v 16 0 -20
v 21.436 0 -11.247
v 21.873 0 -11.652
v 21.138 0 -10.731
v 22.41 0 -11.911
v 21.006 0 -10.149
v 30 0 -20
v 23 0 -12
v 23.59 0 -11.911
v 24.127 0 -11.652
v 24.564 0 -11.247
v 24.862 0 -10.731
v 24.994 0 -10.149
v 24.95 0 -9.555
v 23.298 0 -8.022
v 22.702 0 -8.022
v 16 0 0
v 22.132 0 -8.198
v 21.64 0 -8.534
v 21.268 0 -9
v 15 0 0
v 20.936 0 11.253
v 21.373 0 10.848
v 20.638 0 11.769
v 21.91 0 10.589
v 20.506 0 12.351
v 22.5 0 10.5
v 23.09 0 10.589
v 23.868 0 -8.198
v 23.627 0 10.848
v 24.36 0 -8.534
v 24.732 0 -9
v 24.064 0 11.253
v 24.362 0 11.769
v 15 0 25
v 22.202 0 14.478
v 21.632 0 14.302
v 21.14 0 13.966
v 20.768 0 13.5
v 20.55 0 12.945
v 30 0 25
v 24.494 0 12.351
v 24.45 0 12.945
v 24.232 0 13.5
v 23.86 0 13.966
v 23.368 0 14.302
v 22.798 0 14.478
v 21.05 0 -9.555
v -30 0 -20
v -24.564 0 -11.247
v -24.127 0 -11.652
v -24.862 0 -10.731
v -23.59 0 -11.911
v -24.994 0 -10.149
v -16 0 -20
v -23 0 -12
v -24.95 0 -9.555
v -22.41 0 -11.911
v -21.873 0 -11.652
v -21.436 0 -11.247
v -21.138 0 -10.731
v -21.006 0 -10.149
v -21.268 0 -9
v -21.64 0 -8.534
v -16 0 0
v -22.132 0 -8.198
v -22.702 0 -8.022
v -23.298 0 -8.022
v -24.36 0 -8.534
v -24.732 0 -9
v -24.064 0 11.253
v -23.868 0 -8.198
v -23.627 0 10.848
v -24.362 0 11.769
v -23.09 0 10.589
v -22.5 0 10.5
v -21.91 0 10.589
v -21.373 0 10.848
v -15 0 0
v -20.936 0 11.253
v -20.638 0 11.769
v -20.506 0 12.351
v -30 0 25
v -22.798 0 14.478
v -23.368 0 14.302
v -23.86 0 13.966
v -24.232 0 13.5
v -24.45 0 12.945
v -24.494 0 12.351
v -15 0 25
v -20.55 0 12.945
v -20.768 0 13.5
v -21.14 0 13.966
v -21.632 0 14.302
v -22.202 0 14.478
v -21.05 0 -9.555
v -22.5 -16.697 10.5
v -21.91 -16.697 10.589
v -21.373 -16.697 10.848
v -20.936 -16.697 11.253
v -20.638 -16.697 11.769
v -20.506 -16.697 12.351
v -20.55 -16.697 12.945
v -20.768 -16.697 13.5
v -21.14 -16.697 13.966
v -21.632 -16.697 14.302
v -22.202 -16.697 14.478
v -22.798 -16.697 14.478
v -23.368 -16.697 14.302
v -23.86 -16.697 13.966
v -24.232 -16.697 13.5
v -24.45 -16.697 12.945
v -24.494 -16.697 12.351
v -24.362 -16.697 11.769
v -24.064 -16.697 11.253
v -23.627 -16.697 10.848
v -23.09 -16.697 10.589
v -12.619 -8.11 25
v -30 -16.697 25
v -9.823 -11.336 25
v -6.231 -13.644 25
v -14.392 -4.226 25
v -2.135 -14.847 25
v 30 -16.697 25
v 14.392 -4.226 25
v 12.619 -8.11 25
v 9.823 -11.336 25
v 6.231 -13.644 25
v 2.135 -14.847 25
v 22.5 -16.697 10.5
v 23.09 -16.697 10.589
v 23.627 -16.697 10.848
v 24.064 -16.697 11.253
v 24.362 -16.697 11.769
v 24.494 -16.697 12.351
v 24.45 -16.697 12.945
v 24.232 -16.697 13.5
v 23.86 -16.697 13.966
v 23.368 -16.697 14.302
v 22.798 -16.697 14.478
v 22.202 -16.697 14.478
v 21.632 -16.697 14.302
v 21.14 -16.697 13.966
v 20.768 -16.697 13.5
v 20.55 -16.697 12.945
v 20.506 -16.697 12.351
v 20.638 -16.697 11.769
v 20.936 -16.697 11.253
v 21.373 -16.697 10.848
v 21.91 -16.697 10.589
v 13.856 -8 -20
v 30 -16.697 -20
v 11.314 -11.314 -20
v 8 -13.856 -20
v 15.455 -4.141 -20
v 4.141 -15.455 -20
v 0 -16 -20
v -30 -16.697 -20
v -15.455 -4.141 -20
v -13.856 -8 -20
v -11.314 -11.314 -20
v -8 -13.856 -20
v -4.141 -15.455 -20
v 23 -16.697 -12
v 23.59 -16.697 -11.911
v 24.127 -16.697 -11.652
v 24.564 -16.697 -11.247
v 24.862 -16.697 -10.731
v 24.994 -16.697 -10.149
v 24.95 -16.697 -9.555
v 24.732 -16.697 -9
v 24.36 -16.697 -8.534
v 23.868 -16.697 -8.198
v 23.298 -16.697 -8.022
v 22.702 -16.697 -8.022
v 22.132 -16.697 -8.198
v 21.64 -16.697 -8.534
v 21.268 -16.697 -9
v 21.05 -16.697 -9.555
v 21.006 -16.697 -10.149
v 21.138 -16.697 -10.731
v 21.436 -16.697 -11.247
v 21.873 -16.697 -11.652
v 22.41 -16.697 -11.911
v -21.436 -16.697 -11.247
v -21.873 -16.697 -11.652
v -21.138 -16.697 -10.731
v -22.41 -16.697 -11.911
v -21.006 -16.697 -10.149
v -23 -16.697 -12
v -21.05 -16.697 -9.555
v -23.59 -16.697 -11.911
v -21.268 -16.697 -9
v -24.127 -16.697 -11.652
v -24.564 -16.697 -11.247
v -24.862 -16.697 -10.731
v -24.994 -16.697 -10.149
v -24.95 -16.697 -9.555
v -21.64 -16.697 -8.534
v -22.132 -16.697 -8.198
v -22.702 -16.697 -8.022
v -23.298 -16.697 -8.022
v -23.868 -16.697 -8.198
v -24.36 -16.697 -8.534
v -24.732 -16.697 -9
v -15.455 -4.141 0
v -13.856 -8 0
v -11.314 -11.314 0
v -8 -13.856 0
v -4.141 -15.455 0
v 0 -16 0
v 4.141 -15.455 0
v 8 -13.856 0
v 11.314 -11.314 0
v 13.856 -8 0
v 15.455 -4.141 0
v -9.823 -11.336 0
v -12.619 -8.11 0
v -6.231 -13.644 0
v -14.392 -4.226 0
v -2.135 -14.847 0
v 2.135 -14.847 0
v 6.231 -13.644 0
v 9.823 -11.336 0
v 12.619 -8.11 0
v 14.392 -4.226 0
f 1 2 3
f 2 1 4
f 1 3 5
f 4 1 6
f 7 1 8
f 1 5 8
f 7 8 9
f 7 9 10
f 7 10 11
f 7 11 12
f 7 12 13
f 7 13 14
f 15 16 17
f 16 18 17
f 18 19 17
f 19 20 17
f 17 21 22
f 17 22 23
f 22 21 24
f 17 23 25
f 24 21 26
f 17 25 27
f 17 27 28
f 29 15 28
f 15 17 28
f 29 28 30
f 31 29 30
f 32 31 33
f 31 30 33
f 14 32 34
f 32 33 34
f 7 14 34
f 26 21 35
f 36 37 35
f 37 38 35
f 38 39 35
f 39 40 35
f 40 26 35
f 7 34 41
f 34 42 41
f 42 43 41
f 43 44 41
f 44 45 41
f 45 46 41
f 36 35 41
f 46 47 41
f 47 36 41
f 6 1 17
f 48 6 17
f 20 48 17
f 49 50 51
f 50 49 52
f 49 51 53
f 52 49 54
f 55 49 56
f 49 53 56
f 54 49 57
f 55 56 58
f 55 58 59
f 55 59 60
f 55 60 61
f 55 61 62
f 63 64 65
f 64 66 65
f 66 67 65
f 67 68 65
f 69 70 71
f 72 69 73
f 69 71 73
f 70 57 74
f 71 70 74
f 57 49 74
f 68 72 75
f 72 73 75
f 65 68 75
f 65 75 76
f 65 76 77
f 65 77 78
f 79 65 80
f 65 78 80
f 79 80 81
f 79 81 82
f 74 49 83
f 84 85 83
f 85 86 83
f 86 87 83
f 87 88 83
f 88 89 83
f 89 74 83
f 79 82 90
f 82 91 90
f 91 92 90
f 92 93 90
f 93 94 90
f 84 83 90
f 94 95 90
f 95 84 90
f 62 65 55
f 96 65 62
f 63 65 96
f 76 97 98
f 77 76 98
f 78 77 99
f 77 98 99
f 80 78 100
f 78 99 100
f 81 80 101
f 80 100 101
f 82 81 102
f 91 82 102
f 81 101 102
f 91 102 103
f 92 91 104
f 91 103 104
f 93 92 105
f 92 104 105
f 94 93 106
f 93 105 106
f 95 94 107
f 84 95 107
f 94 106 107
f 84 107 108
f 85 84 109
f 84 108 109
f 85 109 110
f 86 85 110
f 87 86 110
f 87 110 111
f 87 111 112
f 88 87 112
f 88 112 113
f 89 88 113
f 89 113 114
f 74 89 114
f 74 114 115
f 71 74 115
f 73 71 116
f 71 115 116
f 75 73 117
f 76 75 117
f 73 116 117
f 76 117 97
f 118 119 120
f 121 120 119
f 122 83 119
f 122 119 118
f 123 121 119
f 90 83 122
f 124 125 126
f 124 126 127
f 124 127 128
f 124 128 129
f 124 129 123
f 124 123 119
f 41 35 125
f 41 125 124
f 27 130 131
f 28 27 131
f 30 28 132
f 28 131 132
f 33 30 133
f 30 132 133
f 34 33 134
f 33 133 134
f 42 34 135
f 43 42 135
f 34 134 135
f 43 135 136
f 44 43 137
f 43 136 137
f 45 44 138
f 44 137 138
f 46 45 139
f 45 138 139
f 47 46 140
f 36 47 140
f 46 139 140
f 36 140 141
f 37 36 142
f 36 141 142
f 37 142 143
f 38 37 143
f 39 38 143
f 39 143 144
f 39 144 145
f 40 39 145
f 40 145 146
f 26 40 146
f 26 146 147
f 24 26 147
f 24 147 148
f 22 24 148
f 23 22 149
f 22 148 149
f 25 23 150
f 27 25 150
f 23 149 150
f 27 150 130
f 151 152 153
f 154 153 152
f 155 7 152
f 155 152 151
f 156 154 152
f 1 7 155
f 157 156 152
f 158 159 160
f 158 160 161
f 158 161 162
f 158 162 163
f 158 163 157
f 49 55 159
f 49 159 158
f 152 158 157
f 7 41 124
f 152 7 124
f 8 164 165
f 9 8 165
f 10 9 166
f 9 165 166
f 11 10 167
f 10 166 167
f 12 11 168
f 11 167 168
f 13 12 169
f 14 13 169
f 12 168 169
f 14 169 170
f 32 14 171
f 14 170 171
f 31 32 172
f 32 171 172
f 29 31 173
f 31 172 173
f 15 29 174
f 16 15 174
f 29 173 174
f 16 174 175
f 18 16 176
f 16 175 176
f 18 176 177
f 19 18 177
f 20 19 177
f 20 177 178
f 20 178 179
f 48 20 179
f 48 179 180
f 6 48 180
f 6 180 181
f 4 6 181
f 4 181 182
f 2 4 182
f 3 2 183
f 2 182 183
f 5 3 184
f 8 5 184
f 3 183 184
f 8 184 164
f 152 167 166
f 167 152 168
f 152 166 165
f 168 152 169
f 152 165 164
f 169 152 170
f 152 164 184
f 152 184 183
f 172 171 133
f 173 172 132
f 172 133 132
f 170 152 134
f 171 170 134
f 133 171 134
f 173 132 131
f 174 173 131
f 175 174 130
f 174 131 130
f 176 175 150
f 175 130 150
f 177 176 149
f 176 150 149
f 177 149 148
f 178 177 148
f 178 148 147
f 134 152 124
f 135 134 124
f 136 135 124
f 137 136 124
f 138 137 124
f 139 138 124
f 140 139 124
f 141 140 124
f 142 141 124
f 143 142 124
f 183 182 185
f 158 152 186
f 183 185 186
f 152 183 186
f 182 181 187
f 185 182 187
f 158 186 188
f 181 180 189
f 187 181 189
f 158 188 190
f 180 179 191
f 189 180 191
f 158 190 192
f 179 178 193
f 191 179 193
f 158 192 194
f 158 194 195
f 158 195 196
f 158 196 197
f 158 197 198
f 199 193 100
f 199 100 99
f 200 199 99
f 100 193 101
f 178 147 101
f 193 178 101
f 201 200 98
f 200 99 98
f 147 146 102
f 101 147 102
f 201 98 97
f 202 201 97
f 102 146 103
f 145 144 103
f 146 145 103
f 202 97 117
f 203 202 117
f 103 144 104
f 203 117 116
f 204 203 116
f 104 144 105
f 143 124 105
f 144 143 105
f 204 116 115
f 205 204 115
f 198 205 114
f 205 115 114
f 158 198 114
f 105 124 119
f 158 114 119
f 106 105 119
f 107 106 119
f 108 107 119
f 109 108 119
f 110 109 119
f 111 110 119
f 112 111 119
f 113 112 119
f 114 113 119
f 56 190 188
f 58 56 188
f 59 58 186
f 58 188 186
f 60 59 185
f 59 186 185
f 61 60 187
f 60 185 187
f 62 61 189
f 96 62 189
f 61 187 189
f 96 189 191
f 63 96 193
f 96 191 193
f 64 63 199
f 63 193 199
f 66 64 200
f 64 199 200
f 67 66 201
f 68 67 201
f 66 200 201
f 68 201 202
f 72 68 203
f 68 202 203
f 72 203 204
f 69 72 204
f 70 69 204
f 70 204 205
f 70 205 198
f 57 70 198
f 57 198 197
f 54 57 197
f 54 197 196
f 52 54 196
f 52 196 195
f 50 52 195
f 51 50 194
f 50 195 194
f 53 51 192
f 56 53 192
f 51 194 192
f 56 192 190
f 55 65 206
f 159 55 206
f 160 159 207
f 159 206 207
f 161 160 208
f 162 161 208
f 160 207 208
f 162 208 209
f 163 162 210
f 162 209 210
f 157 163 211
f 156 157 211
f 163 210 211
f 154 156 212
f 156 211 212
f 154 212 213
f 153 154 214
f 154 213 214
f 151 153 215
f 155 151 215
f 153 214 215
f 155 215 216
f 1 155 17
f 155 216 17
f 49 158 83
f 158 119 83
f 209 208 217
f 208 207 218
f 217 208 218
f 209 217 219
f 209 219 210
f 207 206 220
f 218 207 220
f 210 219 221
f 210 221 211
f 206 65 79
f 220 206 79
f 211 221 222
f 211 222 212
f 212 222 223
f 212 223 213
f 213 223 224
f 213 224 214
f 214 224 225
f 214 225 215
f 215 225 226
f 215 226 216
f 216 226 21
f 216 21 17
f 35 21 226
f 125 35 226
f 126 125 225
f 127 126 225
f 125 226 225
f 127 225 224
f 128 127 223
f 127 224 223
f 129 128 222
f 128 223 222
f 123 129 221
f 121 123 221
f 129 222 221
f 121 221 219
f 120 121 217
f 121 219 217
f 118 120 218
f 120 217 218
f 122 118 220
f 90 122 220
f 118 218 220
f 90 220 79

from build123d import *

# Parameters (mm, degrees)
BASE_30_MM_DEPTH = 25
BASE_32_MM_DEPTH = 20
ESQUISSE5_R      = 2
VIDE_VIS_DEPTH   = 16.696819514


with BuildPart() as part:
    # Esquisse1 → BASE - 30 mm (new body)
    with BuildSketch(Plane.XY):
        with BuildLine():
            Line((30, 0), (15, 0))
            ThreePointArc((15, 0), (0, -15), (-15, 0))
            Line((-15, 0), (-30, 0))
            Line((-30, 0), (-30, -16.696819514))
            Line((-30, -16.696819514), (30, -16.696819514))
            Line((30, -16.696819514), (30, 0))
        make_face()
    extrude(amount=BASE_30_MM_DEPTH)

    # Esquisse4 → BASE - 32 mm (add)
    with BuildSketch(Plane.XY):
        with BuildLine():
            Line((20, 0), (30, 0))
            Line((30, 0), (30, -16.696819514))
            Line((30, -16.696819514), (-30, -16.696819514))
            Line((-30, -16.696819514), (-30, 0))
            Line((-30, 0), (-20, 0))
            Line((-20, 0), (-16, 0))
            ThreePointArc((-16, 0), (0, -16), (16, 0))
            Line((16, 0), (20, 0))
        make_face()
    extrude(amount=-BASE_32_MM_DEPTH)

    # Esquisse5 → VIDE VIS (cut)
    with BuildSketch(Plane.XZ.offset(16.696819514)):
        with Locations(Location((-23, -10, 0), (0, 0, 270))):
            Circle(ESQUISSE5_R)
        with Locations(Location((-22.5, 12.5, 0), (0, 0, 270))):
            Circle(ESQUISSE5_R)
        with Locations(Location((22.5, 12.5, 0), (0, 0, 270))):
            Circle(ESQUISSE5_R)
        with Locations(Location((23, -10, 0), (0, 0, 270))):
            Circle(ESQUISSE5_R)
    extrude(amount=-VIDE_VIS_DEPTH, mode=Mode.SUBTRACT)


solid = part.part
